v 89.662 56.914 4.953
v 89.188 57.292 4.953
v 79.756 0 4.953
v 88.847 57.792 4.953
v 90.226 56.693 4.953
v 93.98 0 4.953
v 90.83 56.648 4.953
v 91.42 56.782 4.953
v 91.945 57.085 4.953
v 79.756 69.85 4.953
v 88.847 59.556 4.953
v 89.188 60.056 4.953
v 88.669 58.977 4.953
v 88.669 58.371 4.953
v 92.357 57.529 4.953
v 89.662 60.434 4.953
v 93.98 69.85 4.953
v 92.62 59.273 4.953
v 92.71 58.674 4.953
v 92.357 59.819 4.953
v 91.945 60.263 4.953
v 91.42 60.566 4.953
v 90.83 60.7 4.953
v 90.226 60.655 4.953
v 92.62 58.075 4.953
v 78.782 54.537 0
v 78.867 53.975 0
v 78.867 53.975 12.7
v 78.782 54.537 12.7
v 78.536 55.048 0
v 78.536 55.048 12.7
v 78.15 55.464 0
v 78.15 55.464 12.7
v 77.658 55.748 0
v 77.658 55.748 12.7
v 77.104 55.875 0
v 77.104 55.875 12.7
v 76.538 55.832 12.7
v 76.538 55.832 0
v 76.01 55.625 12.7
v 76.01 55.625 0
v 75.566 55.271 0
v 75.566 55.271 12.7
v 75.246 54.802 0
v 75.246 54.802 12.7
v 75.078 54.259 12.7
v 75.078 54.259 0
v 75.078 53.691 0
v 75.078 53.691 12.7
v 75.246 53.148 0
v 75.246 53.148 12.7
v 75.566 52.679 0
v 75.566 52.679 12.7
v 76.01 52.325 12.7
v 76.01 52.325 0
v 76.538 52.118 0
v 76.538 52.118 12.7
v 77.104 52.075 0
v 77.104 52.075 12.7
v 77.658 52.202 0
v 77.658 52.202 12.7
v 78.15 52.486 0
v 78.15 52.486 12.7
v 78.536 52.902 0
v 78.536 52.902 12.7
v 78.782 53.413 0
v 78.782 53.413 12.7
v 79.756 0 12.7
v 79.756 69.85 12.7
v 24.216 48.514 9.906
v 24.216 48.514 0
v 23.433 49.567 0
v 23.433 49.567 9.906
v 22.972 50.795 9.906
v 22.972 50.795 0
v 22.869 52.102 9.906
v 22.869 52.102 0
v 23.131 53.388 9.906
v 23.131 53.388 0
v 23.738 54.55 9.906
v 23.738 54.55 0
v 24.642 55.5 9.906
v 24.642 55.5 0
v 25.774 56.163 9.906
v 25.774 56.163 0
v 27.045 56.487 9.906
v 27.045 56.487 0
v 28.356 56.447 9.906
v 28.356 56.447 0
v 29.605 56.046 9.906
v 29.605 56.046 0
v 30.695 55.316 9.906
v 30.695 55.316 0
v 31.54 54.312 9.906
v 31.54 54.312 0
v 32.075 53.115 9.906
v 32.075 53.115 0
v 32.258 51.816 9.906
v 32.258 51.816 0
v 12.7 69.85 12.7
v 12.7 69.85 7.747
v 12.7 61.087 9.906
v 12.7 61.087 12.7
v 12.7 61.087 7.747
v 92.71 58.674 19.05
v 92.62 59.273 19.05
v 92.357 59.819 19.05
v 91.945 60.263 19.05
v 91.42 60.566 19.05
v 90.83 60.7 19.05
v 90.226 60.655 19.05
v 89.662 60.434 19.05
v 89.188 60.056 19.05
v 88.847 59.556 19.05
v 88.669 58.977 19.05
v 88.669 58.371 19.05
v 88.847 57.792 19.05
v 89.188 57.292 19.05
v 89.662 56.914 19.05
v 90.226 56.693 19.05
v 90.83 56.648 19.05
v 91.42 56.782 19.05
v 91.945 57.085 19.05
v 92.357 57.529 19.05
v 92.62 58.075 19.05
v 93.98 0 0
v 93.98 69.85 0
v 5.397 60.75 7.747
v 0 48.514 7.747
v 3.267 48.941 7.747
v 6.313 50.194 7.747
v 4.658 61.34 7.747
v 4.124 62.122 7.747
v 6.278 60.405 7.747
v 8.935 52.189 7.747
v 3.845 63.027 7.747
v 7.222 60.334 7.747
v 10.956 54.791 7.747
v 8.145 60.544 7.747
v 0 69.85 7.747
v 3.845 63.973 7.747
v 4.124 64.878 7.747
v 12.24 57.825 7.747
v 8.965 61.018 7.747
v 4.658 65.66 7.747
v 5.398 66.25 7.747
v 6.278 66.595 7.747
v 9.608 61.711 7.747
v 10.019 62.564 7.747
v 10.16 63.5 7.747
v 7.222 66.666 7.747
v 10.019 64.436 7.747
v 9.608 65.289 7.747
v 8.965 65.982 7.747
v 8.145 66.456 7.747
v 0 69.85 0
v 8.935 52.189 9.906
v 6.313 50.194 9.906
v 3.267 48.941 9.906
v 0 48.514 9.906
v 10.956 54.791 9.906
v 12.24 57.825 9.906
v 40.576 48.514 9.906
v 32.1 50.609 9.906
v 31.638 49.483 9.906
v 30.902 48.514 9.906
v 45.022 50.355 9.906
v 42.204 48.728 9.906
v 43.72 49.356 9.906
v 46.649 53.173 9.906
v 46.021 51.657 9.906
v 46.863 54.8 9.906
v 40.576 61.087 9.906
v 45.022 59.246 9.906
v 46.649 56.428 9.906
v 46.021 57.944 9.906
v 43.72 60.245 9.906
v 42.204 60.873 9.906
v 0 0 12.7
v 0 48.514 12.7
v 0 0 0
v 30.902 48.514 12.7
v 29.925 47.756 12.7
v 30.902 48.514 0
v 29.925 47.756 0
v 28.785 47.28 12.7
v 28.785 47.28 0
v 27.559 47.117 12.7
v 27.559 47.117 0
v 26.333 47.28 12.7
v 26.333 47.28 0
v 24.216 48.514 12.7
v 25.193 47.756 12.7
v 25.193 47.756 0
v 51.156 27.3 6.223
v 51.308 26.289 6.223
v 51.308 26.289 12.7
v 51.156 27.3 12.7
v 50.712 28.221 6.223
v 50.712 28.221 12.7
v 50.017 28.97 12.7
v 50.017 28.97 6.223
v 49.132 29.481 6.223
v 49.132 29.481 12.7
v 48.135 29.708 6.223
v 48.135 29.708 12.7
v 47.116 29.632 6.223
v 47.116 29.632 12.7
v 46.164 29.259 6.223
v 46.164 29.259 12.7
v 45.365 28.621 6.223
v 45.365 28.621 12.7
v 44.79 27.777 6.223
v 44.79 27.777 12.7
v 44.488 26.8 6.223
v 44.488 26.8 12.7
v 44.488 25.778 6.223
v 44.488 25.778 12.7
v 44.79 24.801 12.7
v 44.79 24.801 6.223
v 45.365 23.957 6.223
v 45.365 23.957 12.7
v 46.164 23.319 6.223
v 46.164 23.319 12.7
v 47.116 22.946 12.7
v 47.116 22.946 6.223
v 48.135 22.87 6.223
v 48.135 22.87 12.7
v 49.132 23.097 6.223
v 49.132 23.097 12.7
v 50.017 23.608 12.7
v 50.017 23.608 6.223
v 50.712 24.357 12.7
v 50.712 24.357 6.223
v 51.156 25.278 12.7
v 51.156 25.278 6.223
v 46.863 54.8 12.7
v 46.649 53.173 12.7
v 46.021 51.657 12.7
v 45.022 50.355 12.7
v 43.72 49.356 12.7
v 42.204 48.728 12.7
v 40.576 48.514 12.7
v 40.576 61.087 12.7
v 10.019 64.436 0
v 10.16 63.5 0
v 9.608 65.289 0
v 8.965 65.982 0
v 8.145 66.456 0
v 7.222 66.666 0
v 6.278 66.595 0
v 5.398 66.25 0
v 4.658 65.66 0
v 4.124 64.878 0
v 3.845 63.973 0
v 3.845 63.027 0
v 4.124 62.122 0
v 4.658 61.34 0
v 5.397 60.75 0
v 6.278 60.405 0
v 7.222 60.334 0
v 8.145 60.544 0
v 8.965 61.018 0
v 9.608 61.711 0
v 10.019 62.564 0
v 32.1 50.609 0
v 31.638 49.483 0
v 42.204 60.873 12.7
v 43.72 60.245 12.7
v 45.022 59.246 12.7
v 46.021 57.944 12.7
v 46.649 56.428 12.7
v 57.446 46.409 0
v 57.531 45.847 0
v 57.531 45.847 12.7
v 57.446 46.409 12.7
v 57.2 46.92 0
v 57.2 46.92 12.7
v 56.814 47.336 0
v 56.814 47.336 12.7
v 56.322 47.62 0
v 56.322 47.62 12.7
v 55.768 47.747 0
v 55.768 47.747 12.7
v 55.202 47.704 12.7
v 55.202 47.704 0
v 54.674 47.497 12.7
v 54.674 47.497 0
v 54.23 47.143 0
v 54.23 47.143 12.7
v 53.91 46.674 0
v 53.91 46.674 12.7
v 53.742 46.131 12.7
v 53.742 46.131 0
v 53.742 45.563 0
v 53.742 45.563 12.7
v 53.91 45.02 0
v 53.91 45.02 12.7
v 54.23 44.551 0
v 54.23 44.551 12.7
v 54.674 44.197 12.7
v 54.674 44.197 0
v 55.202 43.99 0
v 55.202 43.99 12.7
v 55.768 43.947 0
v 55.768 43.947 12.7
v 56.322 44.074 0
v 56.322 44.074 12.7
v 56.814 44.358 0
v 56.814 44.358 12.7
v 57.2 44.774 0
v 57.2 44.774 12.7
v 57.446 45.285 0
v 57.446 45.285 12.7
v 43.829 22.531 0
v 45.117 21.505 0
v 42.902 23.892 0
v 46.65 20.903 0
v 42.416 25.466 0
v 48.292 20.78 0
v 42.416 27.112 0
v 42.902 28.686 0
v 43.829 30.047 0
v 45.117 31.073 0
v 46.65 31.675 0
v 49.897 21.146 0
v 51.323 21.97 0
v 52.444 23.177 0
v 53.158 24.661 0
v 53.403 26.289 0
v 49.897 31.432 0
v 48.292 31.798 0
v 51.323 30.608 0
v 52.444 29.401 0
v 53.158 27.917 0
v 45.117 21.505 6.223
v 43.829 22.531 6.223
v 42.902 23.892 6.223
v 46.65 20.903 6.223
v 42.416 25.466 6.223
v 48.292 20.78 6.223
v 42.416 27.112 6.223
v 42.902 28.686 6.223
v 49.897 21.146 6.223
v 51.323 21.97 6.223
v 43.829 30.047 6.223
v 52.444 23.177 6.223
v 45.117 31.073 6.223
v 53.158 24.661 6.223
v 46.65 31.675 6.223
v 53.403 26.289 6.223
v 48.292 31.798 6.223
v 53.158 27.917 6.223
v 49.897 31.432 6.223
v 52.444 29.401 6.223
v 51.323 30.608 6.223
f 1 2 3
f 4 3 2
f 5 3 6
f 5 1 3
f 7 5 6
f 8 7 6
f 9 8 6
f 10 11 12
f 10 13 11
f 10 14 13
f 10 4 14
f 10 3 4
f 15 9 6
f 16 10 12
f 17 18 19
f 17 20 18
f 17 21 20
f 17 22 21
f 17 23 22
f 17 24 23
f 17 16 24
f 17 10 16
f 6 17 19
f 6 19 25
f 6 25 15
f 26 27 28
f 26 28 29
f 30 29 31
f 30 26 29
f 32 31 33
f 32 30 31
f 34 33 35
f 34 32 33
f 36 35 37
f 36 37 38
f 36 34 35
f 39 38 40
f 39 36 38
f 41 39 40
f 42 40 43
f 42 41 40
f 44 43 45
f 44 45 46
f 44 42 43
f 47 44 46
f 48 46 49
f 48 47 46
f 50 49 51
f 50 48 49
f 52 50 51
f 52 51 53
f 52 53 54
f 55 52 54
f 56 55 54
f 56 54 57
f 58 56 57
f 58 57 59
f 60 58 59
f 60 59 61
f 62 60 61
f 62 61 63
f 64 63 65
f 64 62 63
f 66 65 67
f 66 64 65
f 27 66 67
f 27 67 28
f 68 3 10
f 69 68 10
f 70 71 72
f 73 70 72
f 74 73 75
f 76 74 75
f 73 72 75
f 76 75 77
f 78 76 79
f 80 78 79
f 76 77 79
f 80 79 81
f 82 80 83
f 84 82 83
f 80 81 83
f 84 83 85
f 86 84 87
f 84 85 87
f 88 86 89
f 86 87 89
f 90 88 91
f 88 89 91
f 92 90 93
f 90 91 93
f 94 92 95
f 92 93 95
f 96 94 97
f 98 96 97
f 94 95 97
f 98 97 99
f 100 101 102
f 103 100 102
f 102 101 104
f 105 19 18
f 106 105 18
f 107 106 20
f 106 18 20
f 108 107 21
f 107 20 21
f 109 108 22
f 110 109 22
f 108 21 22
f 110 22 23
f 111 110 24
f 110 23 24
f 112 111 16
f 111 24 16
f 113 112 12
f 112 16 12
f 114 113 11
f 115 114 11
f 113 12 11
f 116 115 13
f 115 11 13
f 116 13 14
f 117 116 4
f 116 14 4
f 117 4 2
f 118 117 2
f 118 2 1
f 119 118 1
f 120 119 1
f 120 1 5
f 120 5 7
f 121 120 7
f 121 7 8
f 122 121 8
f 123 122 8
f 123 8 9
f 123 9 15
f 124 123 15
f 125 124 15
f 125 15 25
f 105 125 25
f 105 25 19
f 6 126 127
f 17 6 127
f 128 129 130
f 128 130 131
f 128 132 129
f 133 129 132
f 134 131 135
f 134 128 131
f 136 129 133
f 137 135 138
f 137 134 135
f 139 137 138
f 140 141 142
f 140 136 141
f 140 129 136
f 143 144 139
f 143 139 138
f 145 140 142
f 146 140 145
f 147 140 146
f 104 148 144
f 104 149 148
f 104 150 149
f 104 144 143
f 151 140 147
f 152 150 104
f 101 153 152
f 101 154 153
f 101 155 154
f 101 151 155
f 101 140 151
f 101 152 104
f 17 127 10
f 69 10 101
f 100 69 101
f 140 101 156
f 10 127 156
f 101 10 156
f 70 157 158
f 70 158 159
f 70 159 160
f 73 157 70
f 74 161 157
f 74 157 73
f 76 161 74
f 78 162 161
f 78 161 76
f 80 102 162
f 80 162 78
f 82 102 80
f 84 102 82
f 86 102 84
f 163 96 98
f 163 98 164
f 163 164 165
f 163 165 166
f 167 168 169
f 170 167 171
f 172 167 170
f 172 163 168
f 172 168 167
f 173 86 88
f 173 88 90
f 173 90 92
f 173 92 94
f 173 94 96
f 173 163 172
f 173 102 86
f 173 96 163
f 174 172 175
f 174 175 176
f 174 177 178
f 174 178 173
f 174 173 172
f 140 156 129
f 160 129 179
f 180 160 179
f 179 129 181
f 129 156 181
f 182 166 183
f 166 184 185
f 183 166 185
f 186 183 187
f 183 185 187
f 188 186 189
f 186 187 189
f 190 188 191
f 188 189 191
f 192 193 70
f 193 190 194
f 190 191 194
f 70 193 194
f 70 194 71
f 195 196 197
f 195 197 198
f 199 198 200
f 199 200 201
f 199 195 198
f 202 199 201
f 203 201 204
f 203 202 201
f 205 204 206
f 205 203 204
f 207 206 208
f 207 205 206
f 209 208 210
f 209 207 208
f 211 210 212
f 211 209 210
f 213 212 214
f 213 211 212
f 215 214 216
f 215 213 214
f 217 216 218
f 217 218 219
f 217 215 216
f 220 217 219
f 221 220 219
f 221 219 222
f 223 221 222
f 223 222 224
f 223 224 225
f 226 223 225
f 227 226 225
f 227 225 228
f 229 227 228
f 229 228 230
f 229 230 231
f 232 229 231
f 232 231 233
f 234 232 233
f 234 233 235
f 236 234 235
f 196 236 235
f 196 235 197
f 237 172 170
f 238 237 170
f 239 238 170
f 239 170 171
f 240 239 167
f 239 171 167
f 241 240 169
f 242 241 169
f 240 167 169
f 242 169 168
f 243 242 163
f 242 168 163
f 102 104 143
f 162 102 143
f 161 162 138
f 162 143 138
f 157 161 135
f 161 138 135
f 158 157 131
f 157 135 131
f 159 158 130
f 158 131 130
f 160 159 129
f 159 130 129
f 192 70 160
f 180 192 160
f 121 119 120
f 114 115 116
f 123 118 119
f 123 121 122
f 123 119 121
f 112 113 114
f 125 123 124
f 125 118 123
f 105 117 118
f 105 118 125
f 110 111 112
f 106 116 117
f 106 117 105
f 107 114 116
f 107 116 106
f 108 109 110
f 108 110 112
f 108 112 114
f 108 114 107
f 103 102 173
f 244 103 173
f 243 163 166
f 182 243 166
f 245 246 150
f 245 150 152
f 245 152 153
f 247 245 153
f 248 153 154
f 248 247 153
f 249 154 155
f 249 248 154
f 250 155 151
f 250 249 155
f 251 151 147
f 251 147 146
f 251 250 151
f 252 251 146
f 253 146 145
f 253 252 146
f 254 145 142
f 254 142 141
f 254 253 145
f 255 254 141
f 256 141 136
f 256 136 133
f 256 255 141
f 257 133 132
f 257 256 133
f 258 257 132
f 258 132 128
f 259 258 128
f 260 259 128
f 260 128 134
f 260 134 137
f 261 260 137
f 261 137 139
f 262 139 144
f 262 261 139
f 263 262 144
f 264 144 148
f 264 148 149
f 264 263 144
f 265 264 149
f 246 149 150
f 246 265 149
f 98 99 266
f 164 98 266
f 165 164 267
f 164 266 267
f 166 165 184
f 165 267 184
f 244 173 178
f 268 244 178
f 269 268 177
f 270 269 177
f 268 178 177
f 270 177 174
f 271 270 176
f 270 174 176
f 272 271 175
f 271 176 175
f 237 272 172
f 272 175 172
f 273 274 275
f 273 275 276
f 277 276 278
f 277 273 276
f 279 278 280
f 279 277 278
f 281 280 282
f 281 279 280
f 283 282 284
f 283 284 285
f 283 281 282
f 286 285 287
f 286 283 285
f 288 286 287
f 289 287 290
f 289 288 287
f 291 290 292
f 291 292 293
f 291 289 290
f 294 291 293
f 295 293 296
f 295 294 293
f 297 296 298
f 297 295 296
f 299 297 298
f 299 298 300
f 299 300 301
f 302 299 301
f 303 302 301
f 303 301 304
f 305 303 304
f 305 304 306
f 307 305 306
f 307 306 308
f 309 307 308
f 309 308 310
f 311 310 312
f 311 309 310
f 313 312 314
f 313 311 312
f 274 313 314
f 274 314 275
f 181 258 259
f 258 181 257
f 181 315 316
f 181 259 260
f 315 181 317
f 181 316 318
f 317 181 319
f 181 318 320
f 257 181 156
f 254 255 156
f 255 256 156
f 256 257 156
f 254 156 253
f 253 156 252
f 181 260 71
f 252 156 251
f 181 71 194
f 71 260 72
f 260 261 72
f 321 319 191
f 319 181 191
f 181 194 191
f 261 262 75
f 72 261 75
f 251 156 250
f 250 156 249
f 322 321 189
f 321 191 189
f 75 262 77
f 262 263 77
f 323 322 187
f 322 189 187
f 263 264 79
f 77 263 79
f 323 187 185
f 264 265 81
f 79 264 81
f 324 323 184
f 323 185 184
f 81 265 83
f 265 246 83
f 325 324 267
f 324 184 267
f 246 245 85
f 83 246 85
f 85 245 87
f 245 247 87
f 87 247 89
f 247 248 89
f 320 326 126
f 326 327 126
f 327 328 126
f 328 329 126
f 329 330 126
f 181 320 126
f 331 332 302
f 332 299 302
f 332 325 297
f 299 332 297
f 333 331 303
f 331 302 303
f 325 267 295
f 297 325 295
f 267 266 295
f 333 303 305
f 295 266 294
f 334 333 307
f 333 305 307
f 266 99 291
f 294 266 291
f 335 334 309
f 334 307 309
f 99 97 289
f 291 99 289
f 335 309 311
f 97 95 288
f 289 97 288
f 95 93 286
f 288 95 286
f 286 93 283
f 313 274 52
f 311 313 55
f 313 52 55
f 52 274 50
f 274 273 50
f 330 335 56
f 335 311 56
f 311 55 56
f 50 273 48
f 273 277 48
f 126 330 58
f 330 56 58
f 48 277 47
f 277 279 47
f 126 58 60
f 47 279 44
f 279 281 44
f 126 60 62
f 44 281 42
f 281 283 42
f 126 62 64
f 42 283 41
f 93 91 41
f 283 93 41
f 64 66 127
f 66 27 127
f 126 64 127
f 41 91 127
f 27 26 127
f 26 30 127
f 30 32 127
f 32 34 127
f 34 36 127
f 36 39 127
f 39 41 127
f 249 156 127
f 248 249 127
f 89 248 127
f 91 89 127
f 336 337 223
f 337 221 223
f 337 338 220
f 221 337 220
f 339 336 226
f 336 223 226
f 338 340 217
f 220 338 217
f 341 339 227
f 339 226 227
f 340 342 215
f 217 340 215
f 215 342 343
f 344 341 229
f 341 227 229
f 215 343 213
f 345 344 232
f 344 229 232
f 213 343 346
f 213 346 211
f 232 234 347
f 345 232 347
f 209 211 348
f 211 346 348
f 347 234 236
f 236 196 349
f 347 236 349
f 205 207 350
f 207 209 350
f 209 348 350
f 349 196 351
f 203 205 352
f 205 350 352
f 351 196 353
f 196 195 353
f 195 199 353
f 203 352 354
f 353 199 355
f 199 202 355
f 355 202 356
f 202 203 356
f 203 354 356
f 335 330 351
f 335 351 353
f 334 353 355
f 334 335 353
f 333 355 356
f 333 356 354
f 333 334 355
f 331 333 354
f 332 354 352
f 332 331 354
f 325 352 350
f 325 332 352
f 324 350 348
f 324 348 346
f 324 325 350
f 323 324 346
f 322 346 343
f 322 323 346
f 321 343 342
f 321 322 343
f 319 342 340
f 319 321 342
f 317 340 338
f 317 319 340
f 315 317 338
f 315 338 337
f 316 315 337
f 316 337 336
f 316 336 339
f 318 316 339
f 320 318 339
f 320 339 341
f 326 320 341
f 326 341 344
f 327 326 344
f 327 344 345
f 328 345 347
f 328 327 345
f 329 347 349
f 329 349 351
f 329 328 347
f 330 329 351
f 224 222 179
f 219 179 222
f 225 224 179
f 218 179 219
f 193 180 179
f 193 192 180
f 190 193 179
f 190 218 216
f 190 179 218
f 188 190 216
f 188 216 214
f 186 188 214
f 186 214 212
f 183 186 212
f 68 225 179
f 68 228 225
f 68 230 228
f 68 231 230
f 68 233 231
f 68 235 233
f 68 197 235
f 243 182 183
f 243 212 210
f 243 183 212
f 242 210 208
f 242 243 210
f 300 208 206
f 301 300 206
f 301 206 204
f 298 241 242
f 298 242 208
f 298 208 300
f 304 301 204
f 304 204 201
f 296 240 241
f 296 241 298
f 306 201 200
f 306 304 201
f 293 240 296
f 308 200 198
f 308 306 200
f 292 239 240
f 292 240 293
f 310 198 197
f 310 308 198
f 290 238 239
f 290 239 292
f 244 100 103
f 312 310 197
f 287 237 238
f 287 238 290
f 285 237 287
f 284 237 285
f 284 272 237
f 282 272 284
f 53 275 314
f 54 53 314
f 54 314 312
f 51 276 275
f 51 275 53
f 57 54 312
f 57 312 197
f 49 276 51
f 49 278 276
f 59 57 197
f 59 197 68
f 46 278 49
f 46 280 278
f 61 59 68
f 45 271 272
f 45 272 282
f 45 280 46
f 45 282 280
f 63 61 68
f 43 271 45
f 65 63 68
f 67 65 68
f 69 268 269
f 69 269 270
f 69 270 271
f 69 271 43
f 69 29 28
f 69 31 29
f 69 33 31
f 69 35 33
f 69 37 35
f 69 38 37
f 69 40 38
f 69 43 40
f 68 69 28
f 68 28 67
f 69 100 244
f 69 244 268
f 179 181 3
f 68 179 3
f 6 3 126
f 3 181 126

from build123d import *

# Parameters (mm, degrees)
F0_W     = 14.224
F0_H     = 69.85
F0_R     = 2.032
F1_DEPTH = 4.953
F0_R_2   = 3.429
F0_R_3   = 1.905
F2_DEPTH = 12.7
F3_DEPTH = 9.906
F0_R_4   = 3.175
F4_DEPTH = 7.747
F5_DEPTH = 19.05
F6_R     = 5.5245
F6_R_2   = 3.429
F7_DEPTH = 6.223


with BuildPart() as f1:
    # F0 (on Top) → F1 (new body)
    with BuildSketch(Plane.XY):
        with Locations((86.868, 34.925)):
            Rectangle(F0_W, F0_H)
        with Locations((90.678, 58.674)):
            Circle(F0_R, mode=Mode.SUBTRACT)
    extrude(amount=F1_DEPTH)

    # F0 (on Top) → F2 (join)
    with BuildSketch(Plane.XY):
        with BuildLine():
            Line((0, 48.514), (0, 0))
            Line((0, 0), (79.756, 0))
            Line((79.756, 0), (79.756, 69.85))
            Line((79.756, 69.85), (12.7, 69.85))
            Line((12.7, 69.85), (12.7, 61.087))
            Line((12.7, 61.087), (40.5765, 61.087))
            ThreePointArc((40.5765, 61.087), (45.021727, 59.245727), (46.863, 54.8005))
            ThreePointArc((46.863, 54.8005), (45.021727, 50.355273), (40.5765, 48.514))
            Line((40.5765, 48.514), (30.902261, 48.514))
            ThreePointArc((30.902261, 48.514), (27.559, 47.117), (24.215739, 48.514))
            Line((24.215739, 48.514), (0, 48.514))
        make_face()
        with Locations((47.879, 26.289)):
            Circle(F0_R_2, mode=Mode.SUBTRACT)
        with Locations((55.626, 45.847)):
            Circle(F0_R_3, mode=Mode.SUBTRACT)
        with Locations((76.962, 53.975)):
            Circle(F0_R_3, mode=Mode.SUBTRACT)
    extrude(amount=F2_DEPTH)

    # F0 (on Top) → F3 (join)
    with BuildSketch(Plane.XY):
        with BuildLine():
            ThreePointArc((12.7, 61.087), (8.935468, 52.188917), (0, 48.514))
            Line((0, 48.514), (24.215739, 48.514))
            ThreePointArc((24.215739, 48.514), (25.774257, 56.162872), (32.258, 51.816))
            ThreePointArc((32.258, 51.816), (31.905872, 50.031257), (30.902261, 48.514))
            Line((30.902261, 48.514), (40.5765, 48.514))
            ThreePointArc((40.5765, 48.514), (45.021727, 50.355273), (46.863, 54.8005))
            ThreePointArc((46.863, 54.8005), (45.021727, 59.245727), (40.5765, 61.087))
            Line((40.5765, 61.087), (12.7, 61.087))
        make_face()
    extrude(amount=F3_DEPTH)

    # F0 (on Top) → F4 (join)
    with BuildSketch(Plane.XY):
        with BuildLine():
            Line((0, 69.85), (0, 48.514))
            ThreePointArc((0, 48.514), (8.935468, 52.188917), (12.7, 61.087))
            Line((12.7, 61.087), (12.7, 69.85))
            Line((12.7, 69.85), (0, 69.85))
        make_face()
        with Locations((6.985, 63.5)):
            Circle(F0_R_4, mode=Mode.SUBTRACT)
    extrude(amount=F4_DEPTH)

    # F0 (on Top) → F5 (join)
    with BuildSketch(Plane.XY):
        with Locations((90.678, 58.674)):
            Circle(F0_R)
    extrude(amount=F5_DEPTH)

    # F6 (on face) → F7 (cut)
    with BuildSketch(Plane.XY):
        with Locations((47.879, 26.289)):
            Circle(F6_R)
        with Locations((47.879, 26.289)):
            Circle(F6_R_2, mode=Mode.SUBTRACT)
    extrude(amount=F7_DEPTH, mode=Mode.SUBTRACT)


solid = f1.part
